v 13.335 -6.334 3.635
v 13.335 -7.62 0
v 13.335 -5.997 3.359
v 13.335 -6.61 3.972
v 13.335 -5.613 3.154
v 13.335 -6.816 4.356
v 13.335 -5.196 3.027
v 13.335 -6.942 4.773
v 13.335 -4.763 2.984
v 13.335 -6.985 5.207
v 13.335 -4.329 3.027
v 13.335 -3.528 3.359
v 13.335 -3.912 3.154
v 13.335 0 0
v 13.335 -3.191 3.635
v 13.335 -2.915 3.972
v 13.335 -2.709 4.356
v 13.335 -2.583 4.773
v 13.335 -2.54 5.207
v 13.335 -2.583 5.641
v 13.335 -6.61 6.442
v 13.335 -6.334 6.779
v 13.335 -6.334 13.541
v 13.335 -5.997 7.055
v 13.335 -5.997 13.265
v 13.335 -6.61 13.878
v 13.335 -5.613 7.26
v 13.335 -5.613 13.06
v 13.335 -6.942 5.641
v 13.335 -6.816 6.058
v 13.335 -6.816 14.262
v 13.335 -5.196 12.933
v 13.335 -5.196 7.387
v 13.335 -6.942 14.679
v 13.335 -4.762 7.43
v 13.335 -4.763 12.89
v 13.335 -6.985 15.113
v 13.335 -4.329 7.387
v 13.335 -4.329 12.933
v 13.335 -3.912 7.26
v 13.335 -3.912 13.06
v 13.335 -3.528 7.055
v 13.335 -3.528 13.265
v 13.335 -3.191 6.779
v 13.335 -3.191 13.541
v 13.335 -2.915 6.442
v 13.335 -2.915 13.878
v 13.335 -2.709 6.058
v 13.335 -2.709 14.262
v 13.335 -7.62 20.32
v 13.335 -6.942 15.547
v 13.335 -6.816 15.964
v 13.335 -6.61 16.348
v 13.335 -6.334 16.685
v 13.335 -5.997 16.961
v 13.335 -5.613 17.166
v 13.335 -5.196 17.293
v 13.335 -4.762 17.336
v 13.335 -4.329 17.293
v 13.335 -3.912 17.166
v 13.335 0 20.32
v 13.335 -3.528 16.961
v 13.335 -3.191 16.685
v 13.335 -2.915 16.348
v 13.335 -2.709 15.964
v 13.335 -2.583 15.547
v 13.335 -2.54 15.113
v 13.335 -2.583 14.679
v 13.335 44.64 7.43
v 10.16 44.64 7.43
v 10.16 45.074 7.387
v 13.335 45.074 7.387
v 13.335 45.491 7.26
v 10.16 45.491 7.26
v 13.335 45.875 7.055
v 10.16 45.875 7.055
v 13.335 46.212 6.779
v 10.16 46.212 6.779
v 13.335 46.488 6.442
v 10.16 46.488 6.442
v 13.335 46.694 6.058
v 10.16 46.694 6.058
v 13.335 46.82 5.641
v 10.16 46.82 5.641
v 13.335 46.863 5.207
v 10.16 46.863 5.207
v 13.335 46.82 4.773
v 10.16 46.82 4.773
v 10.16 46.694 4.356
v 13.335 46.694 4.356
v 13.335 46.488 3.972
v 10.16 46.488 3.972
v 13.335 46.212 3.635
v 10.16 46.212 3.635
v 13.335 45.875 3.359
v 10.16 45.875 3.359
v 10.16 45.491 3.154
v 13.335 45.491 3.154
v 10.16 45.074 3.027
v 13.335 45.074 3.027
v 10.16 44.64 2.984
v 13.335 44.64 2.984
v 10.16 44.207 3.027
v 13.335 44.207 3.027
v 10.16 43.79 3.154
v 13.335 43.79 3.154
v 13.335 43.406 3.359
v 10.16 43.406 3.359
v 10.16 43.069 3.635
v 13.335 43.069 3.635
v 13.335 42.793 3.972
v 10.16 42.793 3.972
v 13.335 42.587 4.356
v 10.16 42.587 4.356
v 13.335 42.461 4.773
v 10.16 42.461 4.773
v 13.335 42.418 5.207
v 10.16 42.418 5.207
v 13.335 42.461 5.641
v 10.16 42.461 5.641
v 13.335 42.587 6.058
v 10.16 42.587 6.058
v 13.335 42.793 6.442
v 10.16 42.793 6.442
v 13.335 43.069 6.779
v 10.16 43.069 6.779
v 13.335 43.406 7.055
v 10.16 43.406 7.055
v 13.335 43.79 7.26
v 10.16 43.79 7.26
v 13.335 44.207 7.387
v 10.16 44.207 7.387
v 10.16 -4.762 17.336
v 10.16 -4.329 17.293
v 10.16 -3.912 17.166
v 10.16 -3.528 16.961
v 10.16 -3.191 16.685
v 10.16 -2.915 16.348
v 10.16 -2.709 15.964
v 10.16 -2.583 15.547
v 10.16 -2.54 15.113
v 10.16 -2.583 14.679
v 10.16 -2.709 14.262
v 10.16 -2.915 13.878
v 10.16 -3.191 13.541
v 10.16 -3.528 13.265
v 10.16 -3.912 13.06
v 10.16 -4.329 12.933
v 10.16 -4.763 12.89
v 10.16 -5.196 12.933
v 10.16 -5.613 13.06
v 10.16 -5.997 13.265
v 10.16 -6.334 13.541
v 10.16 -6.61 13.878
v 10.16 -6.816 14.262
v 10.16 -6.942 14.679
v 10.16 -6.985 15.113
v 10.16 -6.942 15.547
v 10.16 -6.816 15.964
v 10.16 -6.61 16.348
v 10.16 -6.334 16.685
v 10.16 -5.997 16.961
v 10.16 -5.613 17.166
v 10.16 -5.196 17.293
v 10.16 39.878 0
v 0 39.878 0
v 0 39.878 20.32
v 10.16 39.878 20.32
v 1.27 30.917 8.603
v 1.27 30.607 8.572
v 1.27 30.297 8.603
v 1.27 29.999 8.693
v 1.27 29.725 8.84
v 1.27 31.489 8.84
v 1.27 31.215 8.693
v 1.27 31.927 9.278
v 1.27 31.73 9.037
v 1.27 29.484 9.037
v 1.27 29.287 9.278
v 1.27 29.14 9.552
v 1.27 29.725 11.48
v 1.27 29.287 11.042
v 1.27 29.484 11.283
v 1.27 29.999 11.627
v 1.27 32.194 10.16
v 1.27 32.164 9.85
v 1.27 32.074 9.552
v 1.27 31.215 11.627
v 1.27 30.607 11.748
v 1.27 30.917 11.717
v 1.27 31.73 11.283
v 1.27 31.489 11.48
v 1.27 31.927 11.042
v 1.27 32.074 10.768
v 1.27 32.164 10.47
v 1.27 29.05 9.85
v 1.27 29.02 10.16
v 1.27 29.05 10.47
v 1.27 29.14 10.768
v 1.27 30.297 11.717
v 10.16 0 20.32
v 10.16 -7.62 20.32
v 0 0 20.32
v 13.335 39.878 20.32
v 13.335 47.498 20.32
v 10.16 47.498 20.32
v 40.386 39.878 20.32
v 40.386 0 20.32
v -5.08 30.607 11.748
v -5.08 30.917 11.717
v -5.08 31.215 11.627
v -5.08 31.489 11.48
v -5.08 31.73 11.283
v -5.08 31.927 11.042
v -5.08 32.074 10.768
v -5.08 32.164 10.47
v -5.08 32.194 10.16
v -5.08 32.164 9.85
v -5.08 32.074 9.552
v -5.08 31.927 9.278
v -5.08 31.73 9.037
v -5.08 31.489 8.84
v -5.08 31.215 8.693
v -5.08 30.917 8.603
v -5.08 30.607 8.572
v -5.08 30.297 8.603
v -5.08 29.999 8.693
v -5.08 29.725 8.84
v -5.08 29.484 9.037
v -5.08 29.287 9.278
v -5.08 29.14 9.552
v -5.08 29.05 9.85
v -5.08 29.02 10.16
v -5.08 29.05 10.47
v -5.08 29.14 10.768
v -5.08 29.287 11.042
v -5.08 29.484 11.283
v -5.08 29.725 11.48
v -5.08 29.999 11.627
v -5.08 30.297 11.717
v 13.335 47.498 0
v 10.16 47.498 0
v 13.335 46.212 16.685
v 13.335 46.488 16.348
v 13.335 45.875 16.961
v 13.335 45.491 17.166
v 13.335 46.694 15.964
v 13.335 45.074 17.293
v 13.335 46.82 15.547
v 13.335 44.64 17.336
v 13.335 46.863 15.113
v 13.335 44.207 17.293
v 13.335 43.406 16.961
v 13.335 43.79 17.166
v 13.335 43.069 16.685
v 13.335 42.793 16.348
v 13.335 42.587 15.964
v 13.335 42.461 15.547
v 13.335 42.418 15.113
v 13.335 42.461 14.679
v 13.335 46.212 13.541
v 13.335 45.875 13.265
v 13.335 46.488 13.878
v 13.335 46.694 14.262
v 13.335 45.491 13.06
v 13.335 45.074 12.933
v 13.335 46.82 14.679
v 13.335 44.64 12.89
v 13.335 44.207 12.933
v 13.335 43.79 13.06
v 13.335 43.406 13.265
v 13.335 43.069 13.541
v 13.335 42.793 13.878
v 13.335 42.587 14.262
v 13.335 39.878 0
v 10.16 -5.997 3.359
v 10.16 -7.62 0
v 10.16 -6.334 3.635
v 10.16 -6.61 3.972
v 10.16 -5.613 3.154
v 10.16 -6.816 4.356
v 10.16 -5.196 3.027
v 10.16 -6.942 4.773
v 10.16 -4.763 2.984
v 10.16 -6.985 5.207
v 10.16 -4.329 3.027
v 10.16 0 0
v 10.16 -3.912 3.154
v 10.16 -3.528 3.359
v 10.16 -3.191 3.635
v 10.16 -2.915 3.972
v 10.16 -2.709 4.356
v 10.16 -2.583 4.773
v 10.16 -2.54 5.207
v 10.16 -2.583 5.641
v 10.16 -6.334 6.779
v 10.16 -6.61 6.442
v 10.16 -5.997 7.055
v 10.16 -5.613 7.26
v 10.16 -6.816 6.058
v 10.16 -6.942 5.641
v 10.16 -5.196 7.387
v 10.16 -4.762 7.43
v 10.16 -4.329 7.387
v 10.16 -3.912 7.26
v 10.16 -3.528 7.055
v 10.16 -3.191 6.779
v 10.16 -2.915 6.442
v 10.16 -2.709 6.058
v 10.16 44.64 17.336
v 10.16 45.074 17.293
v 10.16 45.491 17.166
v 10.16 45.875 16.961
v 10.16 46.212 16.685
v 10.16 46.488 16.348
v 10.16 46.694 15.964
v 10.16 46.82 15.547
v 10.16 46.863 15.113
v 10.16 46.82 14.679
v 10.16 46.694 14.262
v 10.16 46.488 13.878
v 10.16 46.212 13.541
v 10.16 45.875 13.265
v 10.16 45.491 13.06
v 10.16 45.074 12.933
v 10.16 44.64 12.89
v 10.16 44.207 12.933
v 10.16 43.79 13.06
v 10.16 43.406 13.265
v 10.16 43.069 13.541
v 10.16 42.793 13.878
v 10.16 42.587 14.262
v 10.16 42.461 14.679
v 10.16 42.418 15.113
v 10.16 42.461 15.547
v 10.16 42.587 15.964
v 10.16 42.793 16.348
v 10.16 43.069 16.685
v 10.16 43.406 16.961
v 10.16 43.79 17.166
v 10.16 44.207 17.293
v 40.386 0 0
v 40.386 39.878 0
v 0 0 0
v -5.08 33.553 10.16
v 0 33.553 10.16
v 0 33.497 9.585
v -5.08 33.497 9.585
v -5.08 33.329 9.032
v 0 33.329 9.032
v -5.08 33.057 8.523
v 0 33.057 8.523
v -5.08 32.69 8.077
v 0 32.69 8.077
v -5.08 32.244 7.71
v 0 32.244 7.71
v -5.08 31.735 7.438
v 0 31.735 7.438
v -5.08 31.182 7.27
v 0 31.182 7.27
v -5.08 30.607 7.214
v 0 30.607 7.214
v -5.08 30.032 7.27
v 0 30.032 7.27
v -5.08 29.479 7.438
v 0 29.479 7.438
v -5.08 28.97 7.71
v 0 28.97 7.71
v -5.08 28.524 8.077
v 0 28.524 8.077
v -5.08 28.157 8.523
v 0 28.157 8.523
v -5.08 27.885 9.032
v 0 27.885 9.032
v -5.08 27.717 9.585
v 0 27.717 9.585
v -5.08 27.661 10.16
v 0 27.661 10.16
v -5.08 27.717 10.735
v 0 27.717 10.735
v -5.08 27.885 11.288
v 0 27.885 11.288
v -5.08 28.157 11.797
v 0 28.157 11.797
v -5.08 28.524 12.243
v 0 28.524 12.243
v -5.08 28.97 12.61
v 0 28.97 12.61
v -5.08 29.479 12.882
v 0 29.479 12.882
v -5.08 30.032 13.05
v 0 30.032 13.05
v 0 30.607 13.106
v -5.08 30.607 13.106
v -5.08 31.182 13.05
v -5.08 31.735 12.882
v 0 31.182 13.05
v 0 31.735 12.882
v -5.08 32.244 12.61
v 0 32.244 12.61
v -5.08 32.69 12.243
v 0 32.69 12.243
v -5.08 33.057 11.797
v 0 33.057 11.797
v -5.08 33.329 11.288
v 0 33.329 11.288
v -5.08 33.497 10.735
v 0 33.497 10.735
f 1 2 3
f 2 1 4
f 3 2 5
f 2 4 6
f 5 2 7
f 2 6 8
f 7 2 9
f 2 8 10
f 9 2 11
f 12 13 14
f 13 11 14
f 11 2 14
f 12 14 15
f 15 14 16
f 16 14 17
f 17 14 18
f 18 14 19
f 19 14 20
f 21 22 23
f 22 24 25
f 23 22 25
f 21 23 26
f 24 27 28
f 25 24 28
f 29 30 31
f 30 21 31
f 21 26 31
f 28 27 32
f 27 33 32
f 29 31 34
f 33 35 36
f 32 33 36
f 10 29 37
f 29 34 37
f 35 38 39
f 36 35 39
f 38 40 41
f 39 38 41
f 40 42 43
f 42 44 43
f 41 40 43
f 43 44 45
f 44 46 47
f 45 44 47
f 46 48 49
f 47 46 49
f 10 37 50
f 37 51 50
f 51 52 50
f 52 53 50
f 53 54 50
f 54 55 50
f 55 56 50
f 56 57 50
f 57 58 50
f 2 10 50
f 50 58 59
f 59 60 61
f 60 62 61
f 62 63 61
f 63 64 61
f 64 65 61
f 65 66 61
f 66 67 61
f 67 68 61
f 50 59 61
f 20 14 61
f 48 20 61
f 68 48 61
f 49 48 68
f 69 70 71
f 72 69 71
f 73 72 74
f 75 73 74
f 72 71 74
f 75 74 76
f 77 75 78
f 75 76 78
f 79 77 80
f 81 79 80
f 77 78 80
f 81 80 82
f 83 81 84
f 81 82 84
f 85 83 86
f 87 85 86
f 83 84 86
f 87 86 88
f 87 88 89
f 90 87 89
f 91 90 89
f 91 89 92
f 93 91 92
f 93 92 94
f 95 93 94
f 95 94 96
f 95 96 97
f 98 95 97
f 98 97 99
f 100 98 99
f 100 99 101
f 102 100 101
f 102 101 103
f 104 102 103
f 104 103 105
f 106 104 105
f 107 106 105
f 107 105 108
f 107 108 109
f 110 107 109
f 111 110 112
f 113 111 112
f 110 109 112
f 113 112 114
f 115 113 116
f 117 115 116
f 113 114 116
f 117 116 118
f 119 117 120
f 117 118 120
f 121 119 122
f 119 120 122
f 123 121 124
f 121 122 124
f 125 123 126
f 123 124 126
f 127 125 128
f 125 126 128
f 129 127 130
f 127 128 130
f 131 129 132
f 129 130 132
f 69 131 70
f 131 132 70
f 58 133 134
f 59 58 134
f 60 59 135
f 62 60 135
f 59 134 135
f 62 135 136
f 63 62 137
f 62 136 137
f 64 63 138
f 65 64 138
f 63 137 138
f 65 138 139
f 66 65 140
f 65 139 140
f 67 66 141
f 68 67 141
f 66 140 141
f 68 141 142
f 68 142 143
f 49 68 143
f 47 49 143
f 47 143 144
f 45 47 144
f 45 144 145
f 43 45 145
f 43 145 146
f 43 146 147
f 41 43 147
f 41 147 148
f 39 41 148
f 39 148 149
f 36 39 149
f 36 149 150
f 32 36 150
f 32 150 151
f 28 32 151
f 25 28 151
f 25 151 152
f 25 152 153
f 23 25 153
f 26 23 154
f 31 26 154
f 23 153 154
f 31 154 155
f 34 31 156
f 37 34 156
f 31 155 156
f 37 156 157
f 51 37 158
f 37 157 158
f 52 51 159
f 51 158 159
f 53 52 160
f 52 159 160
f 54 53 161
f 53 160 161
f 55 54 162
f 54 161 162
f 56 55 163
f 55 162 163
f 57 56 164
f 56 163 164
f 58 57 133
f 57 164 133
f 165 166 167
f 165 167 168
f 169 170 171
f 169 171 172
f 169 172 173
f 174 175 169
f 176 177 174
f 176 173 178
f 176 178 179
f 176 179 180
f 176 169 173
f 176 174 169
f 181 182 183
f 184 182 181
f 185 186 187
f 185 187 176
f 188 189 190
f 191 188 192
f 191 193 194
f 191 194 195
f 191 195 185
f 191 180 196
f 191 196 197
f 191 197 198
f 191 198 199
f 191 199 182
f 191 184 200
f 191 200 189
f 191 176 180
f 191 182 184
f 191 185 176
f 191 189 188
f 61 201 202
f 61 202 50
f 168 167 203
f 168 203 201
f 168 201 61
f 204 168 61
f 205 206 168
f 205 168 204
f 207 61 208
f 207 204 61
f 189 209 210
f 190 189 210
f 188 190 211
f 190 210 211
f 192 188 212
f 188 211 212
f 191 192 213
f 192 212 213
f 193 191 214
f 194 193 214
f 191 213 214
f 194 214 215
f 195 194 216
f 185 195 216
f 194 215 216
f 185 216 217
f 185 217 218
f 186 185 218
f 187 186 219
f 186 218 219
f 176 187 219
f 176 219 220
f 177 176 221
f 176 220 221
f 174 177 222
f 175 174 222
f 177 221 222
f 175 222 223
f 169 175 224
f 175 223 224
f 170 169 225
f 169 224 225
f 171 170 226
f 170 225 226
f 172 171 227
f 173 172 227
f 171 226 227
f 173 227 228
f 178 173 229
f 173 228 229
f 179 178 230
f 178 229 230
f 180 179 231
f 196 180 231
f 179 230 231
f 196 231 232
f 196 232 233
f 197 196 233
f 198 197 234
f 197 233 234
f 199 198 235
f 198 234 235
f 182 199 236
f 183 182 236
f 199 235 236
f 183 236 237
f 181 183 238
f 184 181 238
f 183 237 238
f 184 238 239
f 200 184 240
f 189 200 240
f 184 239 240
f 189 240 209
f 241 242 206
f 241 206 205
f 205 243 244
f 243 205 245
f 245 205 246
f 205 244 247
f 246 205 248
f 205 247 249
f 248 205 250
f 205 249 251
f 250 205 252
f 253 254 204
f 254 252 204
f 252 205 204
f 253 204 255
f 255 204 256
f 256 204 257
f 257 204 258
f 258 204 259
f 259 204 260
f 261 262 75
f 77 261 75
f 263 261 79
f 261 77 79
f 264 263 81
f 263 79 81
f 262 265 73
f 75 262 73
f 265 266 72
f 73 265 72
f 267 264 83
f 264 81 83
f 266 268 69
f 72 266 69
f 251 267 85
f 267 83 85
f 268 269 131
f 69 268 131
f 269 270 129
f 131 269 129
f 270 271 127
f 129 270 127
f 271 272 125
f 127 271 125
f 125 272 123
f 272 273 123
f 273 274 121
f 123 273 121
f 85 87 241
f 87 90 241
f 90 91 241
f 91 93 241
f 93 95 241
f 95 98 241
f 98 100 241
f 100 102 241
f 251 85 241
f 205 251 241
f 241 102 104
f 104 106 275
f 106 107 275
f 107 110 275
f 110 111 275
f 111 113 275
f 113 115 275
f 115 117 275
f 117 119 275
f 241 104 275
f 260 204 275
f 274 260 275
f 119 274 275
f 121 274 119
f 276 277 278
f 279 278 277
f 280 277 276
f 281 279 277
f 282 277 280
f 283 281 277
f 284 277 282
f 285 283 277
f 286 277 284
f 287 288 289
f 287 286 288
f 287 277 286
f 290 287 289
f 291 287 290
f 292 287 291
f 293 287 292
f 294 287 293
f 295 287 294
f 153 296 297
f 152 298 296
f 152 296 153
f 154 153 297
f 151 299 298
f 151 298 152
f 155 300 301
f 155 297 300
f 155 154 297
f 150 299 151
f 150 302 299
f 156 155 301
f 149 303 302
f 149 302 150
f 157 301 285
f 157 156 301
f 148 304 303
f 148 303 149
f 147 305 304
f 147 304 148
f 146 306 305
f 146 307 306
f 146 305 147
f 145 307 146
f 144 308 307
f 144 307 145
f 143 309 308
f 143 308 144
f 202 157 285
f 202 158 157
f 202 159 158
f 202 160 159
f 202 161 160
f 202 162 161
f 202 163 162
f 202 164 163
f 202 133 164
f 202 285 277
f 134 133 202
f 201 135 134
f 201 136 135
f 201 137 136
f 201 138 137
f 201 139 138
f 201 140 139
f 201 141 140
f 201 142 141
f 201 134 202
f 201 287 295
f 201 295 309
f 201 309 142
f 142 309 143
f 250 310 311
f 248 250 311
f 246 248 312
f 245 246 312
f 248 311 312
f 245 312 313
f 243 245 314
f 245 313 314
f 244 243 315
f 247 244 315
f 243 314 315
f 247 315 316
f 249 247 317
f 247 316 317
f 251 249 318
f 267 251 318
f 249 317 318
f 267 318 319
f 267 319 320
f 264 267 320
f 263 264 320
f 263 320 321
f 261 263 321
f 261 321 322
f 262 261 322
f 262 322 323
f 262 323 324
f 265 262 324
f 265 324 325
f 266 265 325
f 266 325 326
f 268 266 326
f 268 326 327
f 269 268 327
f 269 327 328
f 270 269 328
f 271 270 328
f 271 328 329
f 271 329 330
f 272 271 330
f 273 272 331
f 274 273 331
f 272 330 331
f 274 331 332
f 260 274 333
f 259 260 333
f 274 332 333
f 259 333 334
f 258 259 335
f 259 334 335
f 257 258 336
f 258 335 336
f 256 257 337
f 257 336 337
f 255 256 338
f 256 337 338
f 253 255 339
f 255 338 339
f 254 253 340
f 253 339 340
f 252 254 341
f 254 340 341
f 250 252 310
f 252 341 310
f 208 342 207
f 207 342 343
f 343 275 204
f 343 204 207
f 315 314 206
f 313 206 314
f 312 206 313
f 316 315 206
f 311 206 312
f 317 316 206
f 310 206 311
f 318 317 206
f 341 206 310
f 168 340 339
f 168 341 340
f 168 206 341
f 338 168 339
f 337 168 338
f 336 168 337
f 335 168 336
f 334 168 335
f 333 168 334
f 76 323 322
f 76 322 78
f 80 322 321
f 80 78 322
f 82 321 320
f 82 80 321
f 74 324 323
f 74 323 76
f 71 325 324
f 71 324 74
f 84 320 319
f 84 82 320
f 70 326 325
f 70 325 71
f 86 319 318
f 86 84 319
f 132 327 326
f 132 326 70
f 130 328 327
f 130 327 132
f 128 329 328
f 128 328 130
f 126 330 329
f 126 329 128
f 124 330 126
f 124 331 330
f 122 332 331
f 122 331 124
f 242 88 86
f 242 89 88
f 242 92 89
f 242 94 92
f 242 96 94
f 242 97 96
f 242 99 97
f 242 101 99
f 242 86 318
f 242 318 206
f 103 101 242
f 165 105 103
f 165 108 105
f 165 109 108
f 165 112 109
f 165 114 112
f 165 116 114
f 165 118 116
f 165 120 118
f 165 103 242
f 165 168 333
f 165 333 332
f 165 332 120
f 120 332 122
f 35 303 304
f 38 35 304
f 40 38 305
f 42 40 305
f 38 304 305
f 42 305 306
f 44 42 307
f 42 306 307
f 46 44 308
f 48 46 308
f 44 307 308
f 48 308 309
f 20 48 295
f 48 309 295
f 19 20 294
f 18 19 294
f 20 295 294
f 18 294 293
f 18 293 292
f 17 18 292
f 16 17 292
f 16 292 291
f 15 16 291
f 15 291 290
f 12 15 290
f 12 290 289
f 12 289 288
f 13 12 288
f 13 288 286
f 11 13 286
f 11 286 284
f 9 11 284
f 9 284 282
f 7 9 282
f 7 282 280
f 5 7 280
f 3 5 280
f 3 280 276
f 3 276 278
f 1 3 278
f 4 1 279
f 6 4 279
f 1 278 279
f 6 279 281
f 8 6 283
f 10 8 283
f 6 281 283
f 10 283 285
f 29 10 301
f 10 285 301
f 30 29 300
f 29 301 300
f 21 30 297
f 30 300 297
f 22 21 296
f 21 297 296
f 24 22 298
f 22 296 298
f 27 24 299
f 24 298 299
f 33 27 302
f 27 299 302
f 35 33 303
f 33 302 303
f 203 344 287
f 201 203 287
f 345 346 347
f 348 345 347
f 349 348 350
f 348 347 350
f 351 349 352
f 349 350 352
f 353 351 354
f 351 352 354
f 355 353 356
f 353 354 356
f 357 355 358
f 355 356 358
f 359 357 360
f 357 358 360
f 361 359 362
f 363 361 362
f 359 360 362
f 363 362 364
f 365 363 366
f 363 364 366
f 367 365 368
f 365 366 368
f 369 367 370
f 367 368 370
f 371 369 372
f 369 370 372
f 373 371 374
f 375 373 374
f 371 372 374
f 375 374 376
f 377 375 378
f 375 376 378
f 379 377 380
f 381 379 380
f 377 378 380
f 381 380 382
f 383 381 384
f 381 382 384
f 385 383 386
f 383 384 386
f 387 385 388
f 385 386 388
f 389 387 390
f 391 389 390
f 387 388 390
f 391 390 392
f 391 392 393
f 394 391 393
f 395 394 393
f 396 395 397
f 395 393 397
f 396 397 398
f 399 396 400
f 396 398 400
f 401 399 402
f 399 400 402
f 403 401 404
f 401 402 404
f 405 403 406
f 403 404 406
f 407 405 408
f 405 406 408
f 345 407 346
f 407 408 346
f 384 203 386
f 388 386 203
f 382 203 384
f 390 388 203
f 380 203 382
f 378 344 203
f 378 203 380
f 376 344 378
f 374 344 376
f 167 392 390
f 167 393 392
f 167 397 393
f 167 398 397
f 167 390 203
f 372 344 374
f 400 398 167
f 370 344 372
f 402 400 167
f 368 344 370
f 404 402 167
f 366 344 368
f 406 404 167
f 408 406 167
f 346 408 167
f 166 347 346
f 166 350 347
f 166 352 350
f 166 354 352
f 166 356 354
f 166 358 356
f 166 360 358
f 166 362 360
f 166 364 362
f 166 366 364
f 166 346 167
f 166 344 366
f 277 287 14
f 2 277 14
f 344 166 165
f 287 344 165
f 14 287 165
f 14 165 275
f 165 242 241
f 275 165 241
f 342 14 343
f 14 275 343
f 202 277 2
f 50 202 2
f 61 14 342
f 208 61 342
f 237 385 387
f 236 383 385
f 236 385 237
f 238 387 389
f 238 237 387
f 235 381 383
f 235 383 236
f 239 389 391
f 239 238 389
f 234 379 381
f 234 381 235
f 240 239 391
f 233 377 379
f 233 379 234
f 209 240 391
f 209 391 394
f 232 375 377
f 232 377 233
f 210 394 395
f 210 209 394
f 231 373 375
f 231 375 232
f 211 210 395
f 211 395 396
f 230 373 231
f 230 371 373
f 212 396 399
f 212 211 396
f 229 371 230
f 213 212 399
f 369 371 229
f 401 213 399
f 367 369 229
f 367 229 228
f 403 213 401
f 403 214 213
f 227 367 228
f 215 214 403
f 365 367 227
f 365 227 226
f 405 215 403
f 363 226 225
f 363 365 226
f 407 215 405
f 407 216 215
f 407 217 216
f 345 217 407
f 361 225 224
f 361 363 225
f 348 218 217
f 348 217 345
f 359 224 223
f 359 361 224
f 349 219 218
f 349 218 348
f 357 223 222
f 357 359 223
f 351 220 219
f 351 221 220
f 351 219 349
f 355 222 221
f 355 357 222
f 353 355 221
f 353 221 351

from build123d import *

# Parameters (mm, degrees)
SKETCH1_W           = 40.386
SKETCH1_H           = 39.878
BOSS_EXTRUDE1_DEPTH = 20.32
SKETCH2_R           = 2.9464
BOSS_EXTRUDE2_DEPTH = 5.08
SKETCH3_W           = 3.175
SKETCH3_H           = 20.32
BOSS_EXTRUDE3_DEPTH = 7.62
SKETCH4_W           = 3.175
SKETCH4_H           = 20.32
BOSS_EXTRUDE4_DEPTH = 7.62
SKETCH5_R           = 2.2225
CUT_EXTRUDE1_DEPTH  = 60.854602831
SKETCH6_R           = 1.5875
CUT_EXTRUDE2_DEPTH  = 6.35
SKETCH7_R           = 2.2225
CUT_EXTRUDE3_DEPTH  = 60.854602831


with BuildPart() as part:
    # Sketch1 → Boss-Extrude1 (new body)
    with BuildSketch(Plane.XY):
        with Locations((20.193, 19.939)):
            Rectangle(SKETCH1_W, SKETCH1_H)
    extrude(amount=BOSS_EXTRUDE1_DEPTH)

    # Sketch2 → Boss-Extrude2 (add)
    with BuildSketch(Plane.ZY):
        with Locations(Location((10.16, 30.607, 0), (0, 0, 90))):
            Circle(SKETCH2_R)
    extrude(amount=BOSS_EXTRUDE2_DEPTH)

    # Sketch3 → Boss-Extrude3 (add)
    with BuildSketch(Plane(origin=(0, 39.878, 0), x_dir=(1, 0, 0), z_dir=(0, 1, 0))):
        with Locations((11.7475, -10.16)):
            Rectangle(SKETCH3_W, SKETCH3_H)
    extrude(amount=BOSS_EXTRUDE3_DEPTH)

    # Sketch4 → Boss-Extrude4 (add)
    with BuildSketch(Plane.XZ):
        with Locations((11.7475, 10.16)):
            Rectangle(SKETCH4_W, SKETCH4_H)
    extrude(amount=BOSS_EXTRUDE4_DEPTH)

    # Sketch5 → Cut-Extrude1 (cut, through all)
    with BuildSketch(Plane.ZY.offset(-10.16)):
        with Locations((5.207, 44.6405)):
            Circle(SKETCH5_R)
        with Locations((15.113, 44.6405)):
            Circle(SKETCH5_R)
    extrude(amount=-CUT_EXTRUDE1_DEPTH, mode=Mode.SUBTRACT)

    # Sketch6 → Cut-Extrude2 (cut)
    with BuildSketch(Plane.ZY.offset(5.08)):
        with Locations((10.16, 30.607)):
            Circle(SKETCH6_R)
    extrude(amount=-CUT_EXTRUDE2_DEPTH, mode=Mode.SUBTRACT)

    # Sketch7 → Cut-Extrude3 (cut, through all)
    with BuildSketch(Plane.ZY.offset(-10.16)):
        with Locations((15.113, -4.7625)):
            Circle(SKETCH7_R)
        with Locations((5.207, -4.7625)):
            Circle(SKETCH7_R)
    extrude(amount=-CUT_EXTRUDE3_DEPTH, mode=Mode.SUBTRACT)


solid = part.part
